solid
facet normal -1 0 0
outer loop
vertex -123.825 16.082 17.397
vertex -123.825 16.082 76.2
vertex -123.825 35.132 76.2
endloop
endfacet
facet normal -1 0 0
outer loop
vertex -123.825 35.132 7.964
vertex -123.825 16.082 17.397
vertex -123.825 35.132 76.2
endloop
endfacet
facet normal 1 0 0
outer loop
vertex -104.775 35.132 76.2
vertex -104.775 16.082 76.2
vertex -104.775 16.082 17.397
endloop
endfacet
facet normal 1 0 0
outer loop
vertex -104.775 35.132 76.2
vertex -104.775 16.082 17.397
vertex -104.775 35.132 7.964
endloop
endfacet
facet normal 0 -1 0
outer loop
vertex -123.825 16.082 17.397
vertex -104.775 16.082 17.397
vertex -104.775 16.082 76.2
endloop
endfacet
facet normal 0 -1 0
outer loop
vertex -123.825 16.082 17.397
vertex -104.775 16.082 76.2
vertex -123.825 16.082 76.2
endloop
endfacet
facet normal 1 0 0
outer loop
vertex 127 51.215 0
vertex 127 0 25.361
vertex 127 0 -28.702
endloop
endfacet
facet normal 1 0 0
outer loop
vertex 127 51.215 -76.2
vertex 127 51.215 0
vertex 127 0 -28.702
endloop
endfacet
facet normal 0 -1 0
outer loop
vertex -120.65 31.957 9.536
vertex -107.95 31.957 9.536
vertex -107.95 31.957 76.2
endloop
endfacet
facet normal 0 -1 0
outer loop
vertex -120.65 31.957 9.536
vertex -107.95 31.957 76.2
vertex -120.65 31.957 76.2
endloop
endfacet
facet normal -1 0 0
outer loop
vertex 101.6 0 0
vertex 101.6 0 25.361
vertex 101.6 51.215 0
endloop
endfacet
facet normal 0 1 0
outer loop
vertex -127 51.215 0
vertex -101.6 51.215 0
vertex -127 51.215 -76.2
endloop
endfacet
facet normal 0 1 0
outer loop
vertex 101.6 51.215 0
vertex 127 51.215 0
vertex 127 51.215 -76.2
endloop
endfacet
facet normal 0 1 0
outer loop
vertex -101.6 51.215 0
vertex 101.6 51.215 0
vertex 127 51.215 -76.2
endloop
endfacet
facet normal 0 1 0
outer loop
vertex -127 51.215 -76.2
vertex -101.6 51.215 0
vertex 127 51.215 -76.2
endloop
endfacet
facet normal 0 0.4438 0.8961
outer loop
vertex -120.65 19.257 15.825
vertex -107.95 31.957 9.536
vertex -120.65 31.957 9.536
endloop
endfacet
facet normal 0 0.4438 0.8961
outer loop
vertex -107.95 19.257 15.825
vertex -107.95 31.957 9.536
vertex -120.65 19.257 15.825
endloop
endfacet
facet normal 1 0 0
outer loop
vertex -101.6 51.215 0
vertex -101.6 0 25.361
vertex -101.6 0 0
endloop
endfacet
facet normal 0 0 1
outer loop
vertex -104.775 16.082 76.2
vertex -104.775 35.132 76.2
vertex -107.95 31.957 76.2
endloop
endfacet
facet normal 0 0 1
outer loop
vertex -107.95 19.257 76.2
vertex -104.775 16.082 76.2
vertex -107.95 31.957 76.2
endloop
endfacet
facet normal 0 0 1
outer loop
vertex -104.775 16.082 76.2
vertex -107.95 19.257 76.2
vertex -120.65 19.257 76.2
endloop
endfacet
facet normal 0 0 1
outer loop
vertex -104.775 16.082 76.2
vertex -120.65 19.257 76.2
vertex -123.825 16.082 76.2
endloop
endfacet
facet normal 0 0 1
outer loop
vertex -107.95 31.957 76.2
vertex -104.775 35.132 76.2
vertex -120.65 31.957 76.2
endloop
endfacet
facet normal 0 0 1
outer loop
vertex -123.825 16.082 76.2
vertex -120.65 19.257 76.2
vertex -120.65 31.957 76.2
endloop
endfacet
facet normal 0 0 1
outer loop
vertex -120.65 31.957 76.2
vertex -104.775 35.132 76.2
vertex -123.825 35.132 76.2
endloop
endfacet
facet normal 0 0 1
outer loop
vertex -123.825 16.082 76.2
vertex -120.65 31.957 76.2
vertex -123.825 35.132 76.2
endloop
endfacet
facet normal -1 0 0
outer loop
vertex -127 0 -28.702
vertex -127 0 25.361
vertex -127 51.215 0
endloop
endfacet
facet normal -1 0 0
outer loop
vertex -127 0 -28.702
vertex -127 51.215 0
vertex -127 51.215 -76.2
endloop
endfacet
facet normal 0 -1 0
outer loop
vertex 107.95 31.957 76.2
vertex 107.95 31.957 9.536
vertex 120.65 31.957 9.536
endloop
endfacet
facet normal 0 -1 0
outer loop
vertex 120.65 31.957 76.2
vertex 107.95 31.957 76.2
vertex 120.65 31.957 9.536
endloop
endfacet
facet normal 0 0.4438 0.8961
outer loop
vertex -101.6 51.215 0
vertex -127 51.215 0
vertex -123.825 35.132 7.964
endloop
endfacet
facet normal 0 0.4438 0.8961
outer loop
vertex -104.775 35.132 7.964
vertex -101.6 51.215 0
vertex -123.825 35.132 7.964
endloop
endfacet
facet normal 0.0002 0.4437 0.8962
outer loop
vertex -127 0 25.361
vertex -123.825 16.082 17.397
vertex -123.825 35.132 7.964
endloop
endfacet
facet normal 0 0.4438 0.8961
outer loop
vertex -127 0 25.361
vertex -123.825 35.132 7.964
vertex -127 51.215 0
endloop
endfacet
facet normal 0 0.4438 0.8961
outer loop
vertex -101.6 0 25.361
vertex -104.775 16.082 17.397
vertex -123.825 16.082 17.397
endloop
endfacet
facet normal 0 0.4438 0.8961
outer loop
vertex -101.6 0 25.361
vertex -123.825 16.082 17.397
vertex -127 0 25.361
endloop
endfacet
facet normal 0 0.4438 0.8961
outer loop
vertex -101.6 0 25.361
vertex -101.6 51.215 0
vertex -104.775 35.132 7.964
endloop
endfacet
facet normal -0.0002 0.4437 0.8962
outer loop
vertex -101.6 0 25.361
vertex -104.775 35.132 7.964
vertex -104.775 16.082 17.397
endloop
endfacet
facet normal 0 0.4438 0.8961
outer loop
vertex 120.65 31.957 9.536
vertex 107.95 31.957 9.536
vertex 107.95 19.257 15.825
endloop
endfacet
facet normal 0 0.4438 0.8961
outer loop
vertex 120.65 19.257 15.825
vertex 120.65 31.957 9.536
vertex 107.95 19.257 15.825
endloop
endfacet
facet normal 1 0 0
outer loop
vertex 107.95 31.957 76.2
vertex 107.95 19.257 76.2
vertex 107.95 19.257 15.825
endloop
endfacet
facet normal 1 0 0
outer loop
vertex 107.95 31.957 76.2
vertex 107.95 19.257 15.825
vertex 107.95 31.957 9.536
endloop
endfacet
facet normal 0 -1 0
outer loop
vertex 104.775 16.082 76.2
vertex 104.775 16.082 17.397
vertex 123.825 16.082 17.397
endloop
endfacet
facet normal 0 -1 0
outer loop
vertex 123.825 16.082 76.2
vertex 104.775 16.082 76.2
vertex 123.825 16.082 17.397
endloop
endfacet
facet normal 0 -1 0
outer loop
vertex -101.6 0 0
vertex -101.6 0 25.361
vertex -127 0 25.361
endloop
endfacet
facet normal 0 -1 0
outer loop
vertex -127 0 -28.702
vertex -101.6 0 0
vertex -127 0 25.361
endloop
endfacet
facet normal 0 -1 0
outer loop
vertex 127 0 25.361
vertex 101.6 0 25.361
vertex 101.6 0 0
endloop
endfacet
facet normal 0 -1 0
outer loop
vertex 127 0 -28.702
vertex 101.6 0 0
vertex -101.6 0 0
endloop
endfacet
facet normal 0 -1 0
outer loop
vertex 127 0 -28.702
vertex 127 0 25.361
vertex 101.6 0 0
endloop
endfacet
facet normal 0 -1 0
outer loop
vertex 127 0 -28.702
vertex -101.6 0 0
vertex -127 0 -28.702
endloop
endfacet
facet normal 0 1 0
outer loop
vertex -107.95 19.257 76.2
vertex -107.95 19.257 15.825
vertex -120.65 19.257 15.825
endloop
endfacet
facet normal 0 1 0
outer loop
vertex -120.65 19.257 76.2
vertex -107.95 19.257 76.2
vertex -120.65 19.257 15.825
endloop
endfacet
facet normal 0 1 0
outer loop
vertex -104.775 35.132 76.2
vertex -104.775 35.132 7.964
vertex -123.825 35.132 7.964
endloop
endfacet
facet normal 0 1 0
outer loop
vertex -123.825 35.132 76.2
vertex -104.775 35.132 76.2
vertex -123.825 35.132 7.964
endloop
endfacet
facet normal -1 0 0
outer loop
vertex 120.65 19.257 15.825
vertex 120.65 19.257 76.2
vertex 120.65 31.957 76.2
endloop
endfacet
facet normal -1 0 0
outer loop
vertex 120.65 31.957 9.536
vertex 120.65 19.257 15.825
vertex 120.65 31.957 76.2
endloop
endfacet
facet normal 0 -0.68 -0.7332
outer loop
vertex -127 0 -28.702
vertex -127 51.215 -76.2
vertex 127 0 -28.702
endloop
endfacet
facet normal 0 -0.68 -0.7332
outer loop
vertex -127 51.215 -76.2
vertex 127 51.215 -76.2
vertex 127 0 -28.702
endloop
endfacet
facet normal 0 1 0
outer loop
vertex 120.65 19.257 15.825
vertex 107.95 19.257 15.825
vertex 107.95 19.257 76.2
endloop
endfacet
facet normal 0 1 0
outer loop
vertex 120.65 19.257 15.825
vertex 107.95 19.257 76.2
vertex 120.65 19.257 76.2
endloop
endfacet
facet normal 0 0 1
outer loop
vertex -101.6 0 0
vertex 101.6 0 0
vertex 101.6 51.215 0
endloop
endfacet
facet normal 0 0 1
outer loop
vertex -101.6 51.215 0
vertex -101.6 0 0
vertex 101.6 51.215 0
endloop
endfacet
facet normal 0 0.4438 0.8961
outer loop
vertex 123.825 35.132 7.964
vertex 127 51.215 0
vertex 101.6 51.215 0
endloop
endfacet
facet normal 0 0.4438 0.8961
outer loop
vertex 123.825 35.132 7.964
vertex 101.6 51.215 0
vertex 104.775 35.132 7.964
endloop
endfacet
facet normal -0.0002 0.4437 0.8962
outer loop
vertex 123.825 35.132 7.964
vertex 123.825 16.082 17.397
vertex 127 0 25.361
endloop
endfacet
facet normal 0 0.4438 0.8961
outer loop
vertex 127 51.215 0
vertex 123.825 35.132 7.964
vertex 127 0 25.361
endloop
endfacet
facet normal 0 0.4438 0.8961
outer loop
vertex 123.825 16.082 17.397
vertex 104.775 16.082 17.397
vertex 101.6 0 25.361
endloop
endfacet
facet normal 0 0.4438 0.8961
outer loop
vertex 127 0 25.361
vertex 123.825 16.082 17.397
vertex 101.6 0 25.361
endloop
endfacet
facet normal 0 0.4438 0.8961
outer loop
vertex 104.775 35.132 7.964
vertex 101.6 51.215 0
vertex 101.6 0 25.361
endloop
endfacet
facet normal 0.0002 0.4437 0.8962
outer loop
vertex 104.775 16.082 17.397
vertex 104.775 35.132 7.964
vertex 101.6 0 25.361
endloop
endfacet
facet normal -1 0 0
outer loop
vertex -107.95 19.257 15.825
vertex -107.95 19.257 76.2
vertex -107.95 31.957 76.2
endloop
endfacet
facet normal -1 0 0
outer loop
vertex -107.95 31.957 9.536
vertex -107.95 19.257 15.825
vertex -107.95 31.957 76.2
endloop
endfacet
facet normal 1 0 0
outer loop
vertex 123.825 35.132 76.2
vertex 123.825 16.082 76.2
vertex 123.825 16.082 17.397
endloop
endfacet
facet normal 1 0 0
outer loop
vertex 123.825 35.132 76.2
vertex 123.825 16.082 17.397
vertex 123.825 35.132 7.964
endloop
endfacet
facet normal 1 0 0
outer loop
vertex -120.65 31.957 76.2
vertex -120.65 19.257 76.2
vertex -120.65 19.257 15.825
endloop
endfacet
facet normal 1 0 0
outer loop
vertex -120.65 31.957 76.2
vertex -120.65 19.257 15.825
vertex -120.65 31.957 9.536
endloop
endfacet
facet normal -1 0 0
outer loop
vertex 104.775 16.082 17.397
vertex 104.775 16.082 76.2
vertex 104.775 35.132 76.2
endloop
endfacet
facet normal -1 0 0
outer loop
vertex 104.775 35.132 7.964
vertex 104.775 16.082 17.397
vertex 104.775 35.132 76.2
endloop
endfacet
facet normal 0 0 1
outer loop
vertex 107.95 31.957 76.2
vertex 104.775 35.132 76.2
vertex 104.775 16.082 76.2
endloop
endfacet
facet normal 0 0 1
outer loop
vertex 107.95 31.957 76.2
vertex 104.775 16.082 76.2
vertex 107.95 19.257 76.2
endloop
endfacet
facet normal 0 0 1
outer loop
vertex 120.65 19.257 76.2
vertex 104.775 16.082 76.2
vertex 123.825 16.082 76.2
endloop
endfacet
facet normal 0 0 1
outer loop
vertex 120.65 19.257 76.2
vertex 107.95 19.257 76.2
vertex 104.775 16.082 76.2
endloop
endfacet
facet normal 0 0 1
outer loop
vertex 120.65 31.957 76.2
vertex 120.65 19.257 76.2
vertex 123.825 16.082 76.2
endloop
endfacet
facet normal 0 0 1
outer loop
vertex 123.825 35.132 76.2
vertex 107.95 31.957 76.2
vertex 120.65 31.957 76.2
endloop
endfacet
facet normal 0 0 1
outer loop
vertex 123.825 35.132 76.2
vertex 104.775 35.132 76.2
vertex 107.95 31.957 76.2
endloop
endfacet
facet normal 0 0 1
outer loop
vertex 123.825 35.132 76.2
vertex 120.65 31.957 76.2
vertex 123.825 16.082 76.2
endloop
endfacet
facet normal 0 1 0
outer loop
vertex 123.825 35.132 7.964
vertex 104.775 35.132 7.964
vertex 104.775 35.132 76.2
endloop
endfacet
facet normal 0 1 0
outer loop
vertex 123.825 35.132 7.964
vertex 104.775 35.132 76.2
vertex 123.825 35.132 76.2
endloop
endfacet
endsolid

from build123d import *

# Parameters (mm, degrees)
BOSS_EXTRUDE1_DEPTH = 127
BOSS_EXTRUDE2_START = 101.6
BOSS_EXTRUDE2_DEPTH = 25.4
SKETCH4_W           = 19.05
SKETCH4_H           = 19.05
SKETCH4_W_2         = 12.7
SKETCH4_H_2         = 12.7
BOSS_EXTRUDE3_DEPTH = 76.2


with BuildPart() as part:
    # Sketch1 → Boss-Extrude1 (new, symmetric)
    with BuildSketch(Plane(origin=(0, 0, 0), x_dir=(0, 0, -1), z_dir=(1, 0, 0))):
        Polygon((0, 0), (0, 51.214865967), (76.2, 51.214865967), (28.702, 0), align=None)
    extrude(amount=BOSS_EXTRUDE1_DEPTH, both=True)

    # Sketch3 → Boss-Extrude2 (add)
    with BuildSketch(Plane(origin=(0, 0, 0), x_dir=(0, 0, -1), z_dir=(1, 0, 0)).offset(BOSS_EXTRUDE2_START)):
        Polygon((0, 51.214865967), (-25.360599441, 0), (0, 0), align=None)
    boss_extrude2 = extrude(amount=BOSS_EXTRUDE2_DEPTH)

    # Mirror1: Boss-Extrude2 across plane
    add(boss_extrude2.mirror(Plane(origin=(0, 0, 0), x_dir=(0, 0, 1), z_dir=(1, 0, 0))))

    # Sketch4 → Boss-Extrude3 (add)
    with BuildSketch(Plane.XY):
        with Locations((114.3, 25.607432983)):
            Rectangle(SKETCH4_W, SKETCH4_H)
        with Locations((114.3, 25.607432983)):
            Rectangle(SKETCH4_W_2, SKETCH4_H_2, mode=Mode.SUBTRACT)
    boss_extrude3 = extrude(amount=BOSS_EXTRUDE3_DEPTH)

    # Mirror2: Boss-Extrude3 across plane
    add(boss_extrude3.mirror(Plane(origin=(0, 0, 0), x_dir=(0, 0, 1), z_dir=(1, 0, 0))))


solid = part.part
